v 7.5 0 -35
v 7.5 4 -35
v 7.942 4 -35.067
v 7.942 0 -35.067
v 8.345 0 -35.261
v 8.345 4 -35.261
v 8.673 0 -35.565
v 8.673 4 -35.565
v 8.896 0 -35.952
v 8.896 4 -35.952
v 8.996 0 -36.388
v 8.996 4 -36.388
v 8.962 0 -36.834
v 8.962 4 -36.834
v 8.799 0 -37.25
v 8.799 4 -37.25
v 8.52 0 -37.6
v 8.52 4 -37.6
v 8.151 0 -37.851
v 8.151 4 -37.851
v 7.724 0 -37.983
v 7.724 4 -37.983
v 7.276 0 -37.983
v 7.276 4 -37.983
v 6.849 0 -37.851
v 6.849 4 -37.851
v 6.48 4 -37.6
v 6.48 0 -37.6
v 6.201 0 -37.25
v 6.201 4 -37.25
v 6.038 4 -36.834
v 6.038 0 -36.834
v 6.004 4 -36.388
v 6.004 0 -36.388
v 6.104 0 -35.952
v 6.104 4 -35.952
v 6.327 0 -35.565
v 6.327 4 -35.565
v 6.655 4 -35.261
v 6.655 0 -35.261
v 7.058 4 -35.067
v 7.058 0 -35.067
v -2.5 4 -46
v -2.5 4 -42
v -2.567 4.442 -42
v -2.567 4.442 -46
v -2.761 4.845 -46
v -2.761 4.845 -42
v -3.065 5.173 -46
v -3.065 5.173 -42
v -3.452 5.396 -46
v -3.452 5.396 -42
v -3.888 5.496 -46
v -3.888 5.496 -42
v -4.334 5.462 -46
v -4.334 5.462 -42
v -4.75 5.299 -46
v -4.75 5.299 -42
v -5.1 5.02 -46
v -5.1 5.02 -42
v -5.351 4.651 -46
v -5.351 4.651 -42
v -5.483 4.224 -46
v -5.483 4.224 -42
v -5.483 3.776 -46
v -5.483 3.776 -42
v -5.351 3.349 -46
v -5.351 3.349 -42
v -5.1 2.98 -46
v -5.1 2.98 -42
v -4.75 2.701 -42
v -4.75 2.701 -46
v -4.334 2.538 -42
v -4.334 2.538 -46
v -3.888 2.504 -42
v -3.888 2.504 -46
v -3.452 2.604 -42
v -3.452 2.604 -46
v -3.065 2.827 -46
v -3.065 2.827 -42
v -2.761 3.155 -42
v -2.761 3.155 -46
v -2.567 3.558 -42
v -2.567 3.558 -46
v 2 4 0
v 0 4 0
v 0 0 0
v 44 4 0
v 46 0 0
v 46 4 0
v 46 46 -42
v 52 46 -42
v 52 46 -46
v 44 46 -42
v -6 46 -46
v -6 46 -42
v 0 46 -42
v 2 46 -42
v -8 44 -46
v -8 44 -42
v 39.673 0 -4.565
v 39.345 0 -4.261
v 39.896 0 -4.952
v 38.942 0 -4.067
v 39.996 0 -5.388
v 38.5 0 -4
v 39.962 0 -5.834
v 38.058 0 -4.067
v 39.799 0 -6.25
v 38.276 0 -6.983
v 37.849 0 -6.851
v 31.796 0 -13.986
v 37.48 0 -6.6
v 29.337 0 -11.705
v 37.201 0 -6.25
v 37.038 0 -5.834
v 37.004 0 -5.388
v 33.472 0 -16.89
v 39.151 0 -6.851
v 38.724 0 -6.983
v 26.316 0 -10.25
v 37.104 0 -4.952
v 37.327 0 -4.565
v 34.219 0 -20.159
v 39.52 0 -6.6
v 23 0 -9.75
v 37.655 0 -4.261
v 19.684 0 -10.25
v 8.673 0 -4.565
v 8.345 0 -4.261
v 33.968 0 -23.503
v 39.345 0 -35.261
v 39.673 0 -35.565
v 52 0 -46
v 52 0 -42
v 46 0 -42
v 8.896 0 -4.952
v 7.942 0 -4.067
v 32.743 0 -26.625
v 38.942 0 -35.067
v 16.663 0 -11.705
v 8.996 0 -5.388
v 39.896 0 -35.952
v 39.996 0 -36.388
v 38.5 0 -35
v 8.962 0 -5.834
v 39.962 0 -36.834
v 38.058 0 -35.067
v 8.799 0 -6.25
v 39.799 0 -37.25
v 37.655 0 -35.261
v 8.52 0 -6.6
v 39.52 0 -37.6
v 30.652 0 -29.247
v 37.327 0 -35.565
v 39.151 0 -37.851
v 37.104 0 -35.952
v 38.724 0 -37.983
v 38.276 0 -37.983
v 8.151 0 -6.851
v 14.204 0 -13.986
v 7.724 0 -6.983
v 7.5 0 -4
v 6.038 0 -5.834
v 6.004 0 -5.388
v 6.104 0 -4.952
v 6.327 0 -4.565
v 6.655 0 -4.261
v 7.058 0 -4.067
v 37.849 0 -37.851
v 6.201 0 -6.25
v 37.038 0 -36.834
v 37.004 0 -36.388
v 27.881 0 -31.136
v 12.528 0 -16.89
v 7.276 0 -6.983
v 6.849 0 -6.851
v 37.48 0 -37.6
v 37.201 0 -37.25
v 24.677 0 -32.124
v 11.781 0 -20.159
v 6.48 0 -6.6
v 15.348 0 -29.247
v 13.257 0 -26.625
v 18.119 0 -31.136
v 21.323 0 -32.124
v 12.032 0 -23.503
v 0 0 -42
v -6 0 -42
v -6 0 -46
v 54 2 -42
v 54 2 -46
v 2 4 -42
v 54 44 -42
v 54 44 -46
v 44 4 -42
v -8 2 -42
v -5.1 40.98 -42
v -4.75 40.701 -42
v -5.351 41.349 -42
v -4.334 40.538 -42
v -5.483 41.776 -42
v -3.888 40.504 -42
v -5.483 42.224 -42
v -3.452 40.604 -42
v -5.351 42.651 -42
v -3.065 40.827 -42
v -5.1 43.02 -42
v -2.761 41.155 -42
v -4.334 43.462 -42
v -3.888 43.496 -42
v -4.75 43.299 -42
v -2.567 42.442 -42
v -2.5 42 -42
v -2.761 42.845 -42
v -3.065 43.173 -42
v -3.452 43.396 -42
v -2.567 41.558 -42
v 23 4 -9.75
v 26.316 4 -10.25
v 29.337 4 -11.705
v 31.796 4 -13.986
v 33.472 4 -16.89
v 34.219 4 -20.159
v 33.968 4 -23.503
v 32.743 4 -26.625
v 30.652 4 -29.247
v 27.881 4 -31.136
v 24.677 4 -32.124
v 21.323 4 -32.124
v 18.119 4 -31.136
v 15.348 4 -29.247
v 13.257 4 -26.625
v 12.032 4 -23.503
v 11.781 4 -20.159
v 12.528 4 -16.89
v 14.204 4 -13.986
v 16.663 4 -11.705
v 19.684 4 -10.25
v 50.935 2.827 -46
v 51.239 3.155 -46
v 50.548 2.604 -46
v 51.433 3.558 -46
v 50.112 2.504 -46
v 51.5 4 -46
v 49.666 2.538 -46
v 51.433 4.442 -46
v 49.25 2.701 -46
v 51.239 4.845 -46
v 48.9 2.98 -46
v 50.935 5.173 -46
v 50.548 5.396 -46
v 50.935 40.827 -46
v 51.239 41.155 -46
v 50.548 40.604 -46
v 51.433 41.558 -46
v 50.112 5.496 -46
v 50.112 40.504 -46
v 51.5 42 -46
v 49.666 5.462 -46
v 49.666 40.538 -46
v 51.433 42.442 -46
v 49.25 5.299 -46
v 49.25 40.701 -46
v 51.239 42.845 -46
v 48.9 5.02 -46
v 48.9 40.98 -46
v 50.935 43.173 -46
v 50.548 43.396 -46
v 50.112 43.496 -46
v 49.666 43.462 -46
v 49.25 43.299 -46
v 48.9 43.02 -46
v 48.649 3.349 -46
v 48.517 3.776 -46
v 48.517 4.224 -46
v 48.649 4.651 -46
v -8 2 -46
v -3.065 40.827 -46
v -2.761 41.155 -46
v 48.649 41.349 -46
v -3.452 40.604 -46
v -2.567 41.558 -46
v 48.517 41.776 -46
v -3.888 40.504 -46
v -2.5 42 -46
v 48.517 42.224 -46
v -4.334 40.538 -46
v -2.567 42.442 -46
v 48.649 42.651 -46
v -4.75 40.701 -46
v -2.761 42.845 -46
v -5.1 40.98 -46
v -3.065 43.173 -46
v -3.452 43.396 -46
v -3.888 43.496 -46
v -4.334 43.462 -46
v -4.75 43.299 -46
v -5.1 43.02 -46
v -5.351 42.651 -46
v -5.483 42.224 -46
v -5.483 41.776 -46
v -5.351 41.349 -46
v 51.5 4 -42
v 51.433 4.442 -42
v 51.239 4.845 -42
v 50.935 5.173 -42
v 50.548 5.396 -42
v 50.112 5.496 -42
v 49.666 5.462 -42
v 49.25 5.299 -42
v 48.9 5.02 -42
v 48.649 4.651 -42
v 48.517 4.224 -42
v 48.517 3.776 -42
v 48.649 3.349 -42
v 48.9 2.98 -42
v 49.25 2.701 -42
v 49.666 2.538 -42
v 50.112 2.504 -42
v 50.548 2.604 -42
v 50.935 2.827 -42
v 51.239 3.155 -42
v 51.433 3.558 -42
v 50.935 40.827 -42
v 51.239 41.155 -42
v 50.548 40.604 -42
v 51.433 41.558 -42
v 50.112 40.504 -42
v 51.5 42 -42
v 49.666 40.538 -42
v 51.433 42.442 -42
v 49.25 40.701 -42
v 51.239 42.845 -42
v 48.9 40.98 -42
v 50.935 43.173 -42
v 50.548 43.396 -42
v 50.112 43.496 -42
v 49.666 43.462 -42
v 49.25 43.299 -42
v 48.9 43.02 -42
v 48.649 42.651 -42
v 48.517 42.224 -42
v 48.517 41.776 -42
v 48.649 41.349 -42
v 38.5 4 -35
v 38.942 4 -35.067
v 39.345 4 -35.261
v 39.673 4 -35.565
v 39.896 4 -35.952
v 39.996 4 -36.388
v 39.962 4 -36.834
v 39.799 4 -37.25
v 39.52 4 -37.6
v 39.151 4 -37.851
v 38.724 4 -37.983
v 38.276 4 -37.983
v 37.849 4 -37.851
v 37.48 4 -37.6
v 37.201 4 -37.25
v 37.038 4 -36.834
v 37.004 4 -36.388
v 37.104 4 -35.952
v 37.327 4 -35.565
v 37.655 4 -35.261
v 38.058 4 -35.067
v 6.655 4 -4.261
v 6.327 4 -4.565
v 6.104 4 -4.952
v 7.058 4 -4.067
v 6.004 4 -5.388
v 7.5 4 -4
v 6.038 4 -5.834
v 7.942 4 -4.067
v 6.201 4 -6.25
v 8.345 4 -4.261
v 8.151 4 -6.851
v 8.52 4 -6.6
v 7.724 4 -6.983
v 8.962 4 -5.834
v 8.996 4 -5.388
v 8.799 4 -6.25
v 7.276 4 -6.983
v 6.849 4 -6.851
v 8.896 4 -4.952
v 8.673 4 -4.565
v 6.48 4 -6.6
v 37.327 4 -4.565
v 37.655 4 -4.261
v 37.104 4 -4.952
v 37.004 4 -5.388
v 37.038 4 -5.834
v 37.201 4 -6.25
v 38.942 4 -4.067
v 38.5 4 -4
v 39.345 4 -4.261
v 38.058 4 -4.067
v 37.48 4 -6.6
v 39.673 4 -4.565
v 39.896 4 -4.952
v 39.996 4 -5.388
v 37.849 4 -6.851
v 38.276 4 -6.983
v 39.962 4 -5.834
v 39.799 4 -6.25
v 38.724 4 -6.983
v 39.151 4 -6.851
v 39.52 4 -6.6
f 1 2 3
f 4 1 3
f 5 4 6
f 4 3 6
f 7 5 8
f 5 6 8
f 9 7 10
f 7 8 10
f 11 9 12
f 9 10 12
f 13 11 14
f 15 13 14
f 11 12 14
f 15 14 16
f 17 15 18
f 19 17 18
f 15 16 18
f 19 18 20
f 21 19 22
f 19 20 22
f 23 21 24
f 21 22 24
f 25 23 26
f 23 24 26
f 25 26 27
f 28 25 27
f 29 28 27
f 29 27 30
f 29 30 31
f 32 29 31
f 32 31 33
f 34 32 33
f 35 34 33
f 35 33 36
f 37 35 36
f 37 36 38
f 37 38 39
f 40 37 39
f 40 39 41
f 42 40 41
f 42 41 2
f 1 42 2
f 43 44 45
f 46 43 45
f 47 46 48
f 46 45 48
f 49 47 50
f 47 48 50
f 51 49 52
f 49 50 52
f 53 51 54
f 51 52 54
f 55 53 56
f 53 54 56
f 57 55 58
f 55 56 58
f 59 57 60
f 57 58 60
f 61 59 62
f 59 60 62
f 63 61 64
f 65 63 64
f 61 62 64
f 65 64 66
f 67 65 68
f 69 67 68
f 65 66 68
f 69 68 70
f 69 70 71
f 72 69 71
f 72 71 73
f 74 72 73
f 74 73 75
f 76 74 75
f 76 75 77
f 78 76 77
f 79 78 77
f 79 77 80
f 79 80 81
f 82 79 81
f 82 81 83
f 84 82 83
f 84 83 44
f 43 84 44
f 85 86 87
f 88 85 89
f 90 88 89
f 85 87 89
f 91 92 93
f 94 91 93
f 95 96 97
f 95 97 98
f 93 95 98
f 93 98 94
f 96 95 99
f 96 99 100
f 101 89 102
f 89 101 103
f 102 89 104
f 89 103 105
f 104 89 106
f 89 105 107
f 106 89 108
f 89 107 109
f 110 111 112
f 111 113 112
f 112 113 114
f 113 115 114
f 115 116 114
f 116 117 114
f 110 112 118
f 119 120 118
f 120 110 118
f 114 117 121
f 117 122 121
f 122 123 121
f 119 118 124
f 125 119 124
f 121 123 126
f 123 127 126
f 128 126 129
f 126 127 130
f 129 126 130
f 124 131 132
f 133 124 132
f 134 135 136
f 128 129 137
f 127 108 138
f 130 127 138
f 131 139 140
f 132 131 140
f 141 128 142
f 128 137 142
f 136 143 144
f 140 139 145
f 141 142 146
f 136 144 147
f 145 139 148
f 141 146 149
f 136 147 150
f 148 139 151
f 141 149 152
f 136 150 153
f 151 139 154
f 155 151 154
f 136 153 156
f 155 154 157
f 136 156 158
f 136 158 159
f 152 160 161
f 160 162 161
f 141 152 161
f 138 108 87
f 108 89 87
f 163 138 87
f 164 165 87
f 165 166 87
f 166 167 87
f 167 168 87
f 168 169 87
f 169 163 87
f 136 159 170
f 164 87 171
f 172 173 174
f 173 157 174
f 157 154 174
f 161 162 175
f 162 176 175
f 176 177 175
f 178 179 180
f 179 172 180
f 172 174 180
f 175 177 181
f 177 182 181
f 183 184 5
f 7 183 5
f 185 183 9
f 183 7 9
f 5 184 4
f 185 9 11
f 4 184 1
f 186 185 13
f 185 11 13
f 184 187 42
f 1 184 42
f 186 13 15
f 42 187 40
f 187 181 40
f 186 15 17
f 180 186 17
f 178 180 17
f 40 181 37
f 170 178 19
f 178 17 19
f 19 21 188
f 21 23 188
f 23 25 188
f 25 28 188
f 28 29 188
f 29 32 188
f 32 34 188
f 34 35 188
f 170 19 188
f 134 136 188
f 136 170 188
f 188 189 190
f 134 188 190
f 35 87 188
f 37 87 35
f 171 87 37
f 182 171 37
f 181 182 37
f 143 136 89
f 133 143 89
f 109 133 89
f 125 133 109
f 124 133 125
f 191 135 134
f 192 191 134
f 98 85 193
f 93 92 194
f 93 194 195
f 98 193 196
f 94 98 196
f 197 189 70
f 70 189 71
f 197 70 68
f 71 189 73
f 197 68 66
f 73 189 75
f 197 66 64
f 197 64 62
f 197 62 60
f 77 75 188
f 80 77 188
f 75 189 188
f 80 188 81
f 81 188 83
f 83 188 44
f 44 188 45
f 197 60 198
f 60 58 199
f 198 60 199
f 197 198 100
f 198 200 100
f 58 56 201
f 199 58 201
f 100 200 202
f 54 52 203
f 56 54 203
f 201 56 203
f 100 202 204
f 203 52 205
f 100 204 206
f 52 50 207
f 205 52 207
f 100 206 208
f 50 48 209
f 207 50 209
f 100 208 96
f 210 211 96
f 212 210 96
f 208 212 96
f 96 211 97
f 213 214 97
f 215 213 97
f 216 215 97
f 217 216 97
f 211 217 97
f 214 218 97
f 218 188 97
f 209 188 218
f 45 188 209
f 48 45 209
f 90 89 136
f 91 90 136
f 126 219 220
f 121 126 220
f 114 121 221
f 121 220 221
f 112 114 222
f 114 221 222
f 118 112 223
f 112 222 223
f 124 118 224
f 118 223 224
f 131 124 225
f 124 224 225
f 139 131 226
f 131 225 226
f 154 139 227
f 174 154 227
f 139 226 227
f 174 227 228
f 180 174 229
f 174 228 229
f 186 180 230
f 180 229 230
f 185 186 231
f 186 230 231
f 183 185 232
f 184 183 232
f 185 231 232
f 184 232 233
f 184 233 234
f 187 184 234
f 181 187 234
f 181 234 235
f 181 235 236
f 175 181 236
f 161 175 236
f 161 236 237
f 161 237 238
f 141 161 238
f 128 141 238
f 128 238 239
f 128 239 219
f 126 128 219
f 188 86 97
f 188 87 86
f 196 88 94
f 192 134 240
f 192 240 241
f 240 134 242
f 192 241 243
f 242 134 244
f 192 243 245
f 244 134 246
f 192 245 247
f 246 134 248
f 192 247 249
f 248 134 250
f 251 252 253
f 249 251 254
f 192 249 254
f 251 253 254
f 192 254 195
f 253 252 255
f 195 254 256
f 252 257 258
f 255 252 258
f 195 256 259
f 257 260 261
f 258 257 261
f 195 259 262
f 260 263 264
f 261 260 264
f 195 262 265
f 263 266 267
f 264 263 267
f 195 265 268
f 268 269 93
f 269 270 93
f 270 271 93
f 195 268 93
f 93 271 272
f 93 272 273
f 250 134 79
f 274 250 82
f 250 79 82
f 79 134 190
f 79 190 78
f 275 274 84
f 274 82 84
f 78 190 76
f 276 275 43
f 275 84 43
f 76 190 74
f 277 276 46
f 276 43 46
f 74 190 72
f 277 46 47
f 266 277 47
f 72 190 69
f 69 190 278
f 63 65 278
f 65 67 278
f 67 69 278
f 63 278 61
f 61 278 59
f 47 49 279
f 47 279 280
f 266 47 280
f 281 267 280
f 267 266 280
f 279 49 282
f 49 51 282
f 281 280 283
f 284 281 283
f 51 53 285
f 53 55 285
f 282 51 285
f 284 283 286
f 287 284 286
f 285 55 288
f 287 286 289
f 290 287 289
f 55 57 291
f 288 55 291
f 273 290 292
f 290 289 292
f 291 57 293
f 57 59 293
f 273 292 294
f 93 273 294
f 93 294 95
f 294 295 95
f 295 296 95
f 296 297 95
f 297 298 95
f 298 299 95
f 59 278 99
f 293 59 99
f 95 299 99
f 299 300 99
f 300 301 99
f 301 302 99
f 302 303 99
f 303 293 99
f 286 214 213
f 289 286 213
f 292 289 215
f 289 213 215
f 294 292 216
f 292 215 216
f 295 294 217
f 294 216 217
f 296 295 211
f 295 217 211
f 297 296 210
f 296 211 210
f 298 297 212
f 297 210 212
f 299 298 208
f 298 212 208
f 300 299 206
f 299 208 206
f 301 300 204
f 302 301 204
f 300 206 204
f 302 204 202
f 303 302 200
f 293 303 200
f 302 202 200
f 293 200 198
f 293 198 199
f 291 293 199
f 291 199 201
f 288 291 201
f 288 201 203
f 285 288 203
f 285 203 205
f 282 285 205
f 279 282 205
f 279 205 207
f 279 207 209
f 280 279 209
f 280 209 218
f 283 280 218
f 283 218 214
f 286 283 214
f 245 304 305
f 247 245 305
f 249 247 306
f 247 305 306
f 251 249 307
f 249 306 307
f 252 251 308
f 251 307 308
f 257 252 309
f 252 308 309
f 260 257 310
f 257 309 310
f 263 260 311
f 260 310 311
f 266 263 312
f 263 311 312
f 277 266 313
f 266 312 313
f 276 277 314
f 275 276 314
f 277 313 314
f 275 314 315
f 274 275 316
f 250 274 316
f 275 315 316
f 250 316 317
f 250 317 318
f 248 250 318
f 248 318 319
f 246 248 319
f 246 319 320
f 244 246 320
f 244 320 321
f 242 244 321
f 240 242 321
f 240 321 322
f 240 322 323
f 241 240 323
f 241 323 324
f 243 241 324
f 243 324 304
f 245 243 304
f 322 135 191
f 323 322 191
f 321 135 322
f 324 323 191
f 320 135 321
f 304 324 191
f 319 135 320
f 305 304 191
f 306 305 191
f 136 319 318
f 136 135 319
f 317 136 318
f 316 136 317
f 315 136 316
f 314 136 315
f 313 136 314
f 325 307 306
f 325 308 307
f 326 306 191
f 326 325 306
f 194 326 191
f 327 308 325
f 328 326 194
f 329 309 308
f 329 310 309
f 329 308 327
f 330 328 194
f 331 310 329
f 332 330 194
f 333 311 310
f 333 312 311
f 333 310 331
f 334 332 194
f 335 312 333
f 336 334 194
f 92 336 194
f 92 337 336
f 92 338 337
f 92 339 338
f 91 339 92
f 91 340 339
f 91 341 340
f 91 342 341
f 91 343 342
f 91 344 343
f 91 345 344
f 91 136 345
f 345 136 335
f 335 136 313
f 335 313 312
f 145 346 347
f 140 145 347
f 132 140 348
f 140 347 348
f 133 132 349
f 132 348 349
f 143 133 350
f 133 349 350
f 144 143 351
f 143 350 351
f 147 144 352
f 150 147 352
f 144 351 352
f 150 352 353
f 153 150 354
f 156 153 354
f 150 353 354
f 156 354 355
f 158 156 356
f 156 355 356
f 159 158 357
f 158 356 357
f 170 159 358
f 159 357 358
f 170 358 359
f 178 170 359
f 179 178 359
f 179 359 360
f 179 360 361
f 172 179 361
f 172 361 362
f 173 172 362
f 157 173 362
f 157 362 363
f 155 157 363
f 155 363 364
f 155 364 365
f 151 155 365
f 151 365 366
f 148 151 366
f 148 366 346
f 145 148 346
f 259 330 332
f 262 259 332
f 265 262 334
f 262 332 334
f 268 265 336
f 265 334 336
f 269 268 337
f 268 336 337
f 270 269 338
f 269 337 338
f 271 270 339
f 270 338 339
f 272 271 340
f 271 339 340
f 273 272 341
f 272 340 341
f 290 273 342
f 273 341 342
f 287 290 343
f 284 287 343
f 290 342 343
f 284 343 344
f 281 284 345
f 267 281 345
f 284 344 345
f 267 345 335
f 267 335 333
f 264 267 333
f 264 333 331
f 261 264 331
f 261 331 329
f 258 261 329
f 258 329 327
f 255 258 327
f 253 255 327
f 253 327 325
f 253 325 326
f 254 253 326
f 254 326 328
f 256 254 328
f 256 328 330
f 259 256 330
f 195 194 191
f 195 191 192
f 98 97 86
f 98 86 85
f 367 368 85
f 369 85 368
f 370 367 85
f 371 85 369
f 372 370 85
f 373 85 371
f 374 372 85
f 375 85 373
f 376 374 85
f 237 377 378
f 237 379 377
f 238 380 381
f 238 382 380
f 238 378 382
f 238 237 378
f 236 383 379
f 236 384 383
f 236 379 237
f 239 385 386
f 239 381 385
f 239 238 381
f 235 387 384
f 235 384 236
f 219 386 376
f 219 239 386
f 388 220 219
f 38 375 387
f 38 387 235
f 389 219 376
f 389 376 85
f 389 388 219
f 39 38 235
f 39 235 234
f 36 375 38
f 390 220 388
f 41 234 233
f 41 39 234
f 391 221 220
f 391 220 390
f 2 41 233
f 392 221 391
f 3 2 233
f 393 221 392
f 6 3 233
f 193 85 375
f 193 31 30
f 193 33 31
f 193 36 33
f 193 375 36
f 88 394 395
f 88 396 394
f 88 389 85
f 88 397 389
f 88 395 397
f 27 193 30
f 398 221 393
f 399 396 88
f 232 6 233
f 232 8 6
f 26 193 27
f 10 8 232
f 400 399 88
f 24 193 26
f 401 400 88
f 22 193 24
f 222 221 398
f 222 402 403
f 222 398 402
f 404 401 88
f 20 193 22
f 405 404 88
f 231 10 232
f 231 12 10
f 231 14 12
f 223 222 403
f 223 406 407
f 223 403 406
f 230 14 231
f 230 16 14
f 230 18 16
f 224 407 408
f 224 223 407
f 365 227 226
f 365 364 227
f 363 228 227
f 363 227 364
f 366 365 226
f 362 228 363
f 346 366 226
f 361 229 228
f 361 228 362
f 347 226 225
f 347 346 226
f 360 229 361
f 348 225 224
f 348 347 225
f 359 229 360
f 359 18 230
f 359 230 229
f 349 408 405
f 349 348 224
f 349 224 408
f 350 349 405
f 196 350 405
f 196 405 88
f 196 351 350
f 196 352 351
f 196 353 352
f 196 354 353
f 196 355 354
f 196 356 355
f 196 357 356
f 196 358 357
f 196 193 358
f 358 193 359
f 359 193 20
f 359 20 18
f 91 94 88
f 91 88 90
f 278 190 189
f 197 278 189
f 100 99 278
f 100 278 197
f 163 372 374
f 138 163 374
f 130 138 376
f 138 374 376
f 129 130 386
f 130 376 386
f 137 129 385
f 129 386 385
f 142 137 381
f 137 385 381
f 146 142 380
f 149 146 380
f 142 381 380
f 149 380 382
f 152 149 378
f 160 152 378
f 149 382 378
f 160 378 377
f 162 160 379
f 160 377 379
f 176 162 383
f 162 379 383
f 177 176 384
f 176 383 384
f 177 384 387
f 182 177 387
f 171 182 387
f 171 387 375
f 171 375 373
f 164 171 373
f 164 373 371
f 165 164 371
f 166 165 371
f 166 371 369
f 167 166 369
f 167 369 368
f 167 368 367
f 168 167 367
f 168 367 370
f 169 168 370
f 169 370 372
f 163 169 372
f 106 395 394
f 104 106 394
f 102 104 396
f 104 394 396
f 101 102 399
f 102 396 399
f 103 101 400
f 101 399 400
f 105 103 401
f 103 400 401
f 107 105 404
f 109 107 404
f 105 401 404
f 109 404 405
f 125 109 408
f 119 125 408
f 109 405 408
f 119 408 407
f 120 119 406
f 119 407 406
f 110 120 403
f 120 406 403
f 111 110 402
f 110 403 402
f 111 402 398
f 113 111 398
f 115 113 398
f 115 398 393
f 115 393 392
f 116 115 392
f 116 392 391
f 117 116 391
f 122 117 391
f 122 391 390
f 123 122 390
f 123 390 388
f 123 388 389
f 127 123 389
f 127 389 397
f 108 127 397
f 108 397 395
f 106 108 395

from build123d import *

# Parameters (mm, degrees)
SKETCH1_W           = 46
SKETCH1_H           = 46
BOSS_EXTRUDE1_DEPTH = 4
SKETCH2_W           = 46
SKETCH2_H           = 4
BOSS_EXTRUDE2_DEPTH = 42
SKETCH3_W           = 2
SKETCH3_H           = 42
BOSS_EXTRUDE3_DEPTH = 42
CHAMFER1_SIZE       = 42
SKETCH4_R           = 11.25
CUT_EXTRUDE1_DEPTH  = 42
SKETCH5_R           = 1.5
CUT_EXTRUDE2_DEPTH  = 42
SKETCH7_W           = 4
SKETCH7_H           = 46
BOSS_EXTRUDE4_DEPTH = 8
SKETCH8_W           = 4
SKETCH8_H           = 46
BOSS_EXTRUDE5_DEPTH = 8
CHAMFER2_SIZE       = 2
SKETCH6_R           = 1.5
CUT_EXTRUDE3_DEPTH  = 42


with BuildPart() as part:
    # Sketch1 → Boss-Extrude1 (new body)
    with BuildSketch(Plane(origin=(0, 0, 0), x_dir=(1, 0, 0), z_dir=(0, 1, 0))):
        with Locations((23, 23)):
            Rectangle(SKETCH1_W, SKETCH1_H)
    extrude(amount=BOSS_EXTRUDE1_DEPTH)

    # Sketch2 → Boss-Extrude2 (add)
    with BuildSketch(Plane(origin=(0, 4, 0), x_dir=(1, 0, 0), z_dir=(0, 1, 0))):
        with Locations((23, 44)):
            Rectangle(SKETCH2_W, SKETCH2_H)
    extrude(amount=BOSS_EXTRUDE2_DEPTH)

    # Sketch3 → Boss-Extrude3 (add)
    with BuildSketch(Plane(origin=(0, 4, 0), x_dir=(1, 0, 0), z_dir=(0, 1, 0))):
        with Locations((1, 21)):
            Rectangle(SKETCH3_W, SKETCH3_H)
        with Locations((45, 21)):
            Rectangle(SKETCH3_W, SKETCH3_H)
    extrude(amount=BOSS_EXTRUDE3_DEPTH)

    # Chamfer1
    chamfer1_edges = [part.edges().sort_by_distance(p)[0] for p in [
        (45, 46, 0),
        (1, 46, 0),
    ]]
    chamfer(chamfer1_edges, length=CHAMFER1_SIZE)

    # Sketch4 → Cut-Extrude1 (cut)
    with BuildSketch(Plane(origin=(0, 4, 0), x_dir=(1, 0, 0), z_dir=(0, 1, 0))):
        with Locations(Location((23, 21, 0), (0, 0, 270))):
            Circle(SKETCH4_R)
    extrude(amount=-CUT_EXTRUDE1_DEPTH, mode=Mode.SUBTRACT)

    # Sketch5 → Cut-Extrude2 (cut)
    with BuildSketch(Plane(origin=(0, 4, 0), x_dir=(1, 0, 0), z_dir=(0, 1, 0))):
        with Locations(Location((7.5, 36.5, 0), (0, 0, 270))):
            Circle(SKETCH5_R)
        with Locations(Location((7.5, 5.5, 0), (0, 0, 270))):
            Circle(SKETCH5_R)
        with Locations(Location((38.5, 5.5, 0), (0, 0, 270))):
            Circle(SKETCH5_R)
        with Locations(Location((38.5, 36.5, 0), (0, 0, 270))):
            Circle(SKETCH5_R)
    extrude(amount=-CUT_EXTRUDE2_DEPTH, mode=Mode.SUBTRACT)

    # Sketch7 → Boss-Extrude4 (add)
    with BuildSketch(Plane.ZY):
        with Locations((-44, 23)):
            Rectangle(SKETCH7_W, SKETCH7_H)
    extrude(amount=BOSS_EXTRUDE4_DEPTH)

    # Sketch8 → Boss-Extrude5 (add)
    with BuildSketch(Plane(origin=(46, 0, 0), x_dir=(0, 0, -1), z_dir=(1, 0, 0))):
        with Locations((44, 23)):
            Rectangle(SKETCH8_W, SKETCH8_H)
    extrude(amount=BOSS_EXTRUDE5_DEPTH)

    # Chamfer2
    chamfer2_edges = [part.edges().sort_by_distance(p)[0] for p in [
        (54, 46, -44),
        (54, 0, -44),
        (-8, 0, -44),
        (-8, 46, -44),
    ]]
    chamfer(chamfer2_edges, length=CHAMFER2_SIZE)

    # Sketch6 → Cut-Extrude3 (cut)
    with BuildSketch(Plane.XY.offset(-42)):
        with Locations((-4, 42)):
            Circle(SKETCH6_R)
        with Locations((-4, 4)):
            Circle(SKETCH6_R)
        with Locations((50, 4)):
            Circle(SKETCH6_R)
        with Locations((50, 42)):
            Circle(SKETCH6_R)
    extrude(amount=-CUT_EXTRUDE3_DEPTH, mode=Mode.SUBTRACT)


solid = part.part
